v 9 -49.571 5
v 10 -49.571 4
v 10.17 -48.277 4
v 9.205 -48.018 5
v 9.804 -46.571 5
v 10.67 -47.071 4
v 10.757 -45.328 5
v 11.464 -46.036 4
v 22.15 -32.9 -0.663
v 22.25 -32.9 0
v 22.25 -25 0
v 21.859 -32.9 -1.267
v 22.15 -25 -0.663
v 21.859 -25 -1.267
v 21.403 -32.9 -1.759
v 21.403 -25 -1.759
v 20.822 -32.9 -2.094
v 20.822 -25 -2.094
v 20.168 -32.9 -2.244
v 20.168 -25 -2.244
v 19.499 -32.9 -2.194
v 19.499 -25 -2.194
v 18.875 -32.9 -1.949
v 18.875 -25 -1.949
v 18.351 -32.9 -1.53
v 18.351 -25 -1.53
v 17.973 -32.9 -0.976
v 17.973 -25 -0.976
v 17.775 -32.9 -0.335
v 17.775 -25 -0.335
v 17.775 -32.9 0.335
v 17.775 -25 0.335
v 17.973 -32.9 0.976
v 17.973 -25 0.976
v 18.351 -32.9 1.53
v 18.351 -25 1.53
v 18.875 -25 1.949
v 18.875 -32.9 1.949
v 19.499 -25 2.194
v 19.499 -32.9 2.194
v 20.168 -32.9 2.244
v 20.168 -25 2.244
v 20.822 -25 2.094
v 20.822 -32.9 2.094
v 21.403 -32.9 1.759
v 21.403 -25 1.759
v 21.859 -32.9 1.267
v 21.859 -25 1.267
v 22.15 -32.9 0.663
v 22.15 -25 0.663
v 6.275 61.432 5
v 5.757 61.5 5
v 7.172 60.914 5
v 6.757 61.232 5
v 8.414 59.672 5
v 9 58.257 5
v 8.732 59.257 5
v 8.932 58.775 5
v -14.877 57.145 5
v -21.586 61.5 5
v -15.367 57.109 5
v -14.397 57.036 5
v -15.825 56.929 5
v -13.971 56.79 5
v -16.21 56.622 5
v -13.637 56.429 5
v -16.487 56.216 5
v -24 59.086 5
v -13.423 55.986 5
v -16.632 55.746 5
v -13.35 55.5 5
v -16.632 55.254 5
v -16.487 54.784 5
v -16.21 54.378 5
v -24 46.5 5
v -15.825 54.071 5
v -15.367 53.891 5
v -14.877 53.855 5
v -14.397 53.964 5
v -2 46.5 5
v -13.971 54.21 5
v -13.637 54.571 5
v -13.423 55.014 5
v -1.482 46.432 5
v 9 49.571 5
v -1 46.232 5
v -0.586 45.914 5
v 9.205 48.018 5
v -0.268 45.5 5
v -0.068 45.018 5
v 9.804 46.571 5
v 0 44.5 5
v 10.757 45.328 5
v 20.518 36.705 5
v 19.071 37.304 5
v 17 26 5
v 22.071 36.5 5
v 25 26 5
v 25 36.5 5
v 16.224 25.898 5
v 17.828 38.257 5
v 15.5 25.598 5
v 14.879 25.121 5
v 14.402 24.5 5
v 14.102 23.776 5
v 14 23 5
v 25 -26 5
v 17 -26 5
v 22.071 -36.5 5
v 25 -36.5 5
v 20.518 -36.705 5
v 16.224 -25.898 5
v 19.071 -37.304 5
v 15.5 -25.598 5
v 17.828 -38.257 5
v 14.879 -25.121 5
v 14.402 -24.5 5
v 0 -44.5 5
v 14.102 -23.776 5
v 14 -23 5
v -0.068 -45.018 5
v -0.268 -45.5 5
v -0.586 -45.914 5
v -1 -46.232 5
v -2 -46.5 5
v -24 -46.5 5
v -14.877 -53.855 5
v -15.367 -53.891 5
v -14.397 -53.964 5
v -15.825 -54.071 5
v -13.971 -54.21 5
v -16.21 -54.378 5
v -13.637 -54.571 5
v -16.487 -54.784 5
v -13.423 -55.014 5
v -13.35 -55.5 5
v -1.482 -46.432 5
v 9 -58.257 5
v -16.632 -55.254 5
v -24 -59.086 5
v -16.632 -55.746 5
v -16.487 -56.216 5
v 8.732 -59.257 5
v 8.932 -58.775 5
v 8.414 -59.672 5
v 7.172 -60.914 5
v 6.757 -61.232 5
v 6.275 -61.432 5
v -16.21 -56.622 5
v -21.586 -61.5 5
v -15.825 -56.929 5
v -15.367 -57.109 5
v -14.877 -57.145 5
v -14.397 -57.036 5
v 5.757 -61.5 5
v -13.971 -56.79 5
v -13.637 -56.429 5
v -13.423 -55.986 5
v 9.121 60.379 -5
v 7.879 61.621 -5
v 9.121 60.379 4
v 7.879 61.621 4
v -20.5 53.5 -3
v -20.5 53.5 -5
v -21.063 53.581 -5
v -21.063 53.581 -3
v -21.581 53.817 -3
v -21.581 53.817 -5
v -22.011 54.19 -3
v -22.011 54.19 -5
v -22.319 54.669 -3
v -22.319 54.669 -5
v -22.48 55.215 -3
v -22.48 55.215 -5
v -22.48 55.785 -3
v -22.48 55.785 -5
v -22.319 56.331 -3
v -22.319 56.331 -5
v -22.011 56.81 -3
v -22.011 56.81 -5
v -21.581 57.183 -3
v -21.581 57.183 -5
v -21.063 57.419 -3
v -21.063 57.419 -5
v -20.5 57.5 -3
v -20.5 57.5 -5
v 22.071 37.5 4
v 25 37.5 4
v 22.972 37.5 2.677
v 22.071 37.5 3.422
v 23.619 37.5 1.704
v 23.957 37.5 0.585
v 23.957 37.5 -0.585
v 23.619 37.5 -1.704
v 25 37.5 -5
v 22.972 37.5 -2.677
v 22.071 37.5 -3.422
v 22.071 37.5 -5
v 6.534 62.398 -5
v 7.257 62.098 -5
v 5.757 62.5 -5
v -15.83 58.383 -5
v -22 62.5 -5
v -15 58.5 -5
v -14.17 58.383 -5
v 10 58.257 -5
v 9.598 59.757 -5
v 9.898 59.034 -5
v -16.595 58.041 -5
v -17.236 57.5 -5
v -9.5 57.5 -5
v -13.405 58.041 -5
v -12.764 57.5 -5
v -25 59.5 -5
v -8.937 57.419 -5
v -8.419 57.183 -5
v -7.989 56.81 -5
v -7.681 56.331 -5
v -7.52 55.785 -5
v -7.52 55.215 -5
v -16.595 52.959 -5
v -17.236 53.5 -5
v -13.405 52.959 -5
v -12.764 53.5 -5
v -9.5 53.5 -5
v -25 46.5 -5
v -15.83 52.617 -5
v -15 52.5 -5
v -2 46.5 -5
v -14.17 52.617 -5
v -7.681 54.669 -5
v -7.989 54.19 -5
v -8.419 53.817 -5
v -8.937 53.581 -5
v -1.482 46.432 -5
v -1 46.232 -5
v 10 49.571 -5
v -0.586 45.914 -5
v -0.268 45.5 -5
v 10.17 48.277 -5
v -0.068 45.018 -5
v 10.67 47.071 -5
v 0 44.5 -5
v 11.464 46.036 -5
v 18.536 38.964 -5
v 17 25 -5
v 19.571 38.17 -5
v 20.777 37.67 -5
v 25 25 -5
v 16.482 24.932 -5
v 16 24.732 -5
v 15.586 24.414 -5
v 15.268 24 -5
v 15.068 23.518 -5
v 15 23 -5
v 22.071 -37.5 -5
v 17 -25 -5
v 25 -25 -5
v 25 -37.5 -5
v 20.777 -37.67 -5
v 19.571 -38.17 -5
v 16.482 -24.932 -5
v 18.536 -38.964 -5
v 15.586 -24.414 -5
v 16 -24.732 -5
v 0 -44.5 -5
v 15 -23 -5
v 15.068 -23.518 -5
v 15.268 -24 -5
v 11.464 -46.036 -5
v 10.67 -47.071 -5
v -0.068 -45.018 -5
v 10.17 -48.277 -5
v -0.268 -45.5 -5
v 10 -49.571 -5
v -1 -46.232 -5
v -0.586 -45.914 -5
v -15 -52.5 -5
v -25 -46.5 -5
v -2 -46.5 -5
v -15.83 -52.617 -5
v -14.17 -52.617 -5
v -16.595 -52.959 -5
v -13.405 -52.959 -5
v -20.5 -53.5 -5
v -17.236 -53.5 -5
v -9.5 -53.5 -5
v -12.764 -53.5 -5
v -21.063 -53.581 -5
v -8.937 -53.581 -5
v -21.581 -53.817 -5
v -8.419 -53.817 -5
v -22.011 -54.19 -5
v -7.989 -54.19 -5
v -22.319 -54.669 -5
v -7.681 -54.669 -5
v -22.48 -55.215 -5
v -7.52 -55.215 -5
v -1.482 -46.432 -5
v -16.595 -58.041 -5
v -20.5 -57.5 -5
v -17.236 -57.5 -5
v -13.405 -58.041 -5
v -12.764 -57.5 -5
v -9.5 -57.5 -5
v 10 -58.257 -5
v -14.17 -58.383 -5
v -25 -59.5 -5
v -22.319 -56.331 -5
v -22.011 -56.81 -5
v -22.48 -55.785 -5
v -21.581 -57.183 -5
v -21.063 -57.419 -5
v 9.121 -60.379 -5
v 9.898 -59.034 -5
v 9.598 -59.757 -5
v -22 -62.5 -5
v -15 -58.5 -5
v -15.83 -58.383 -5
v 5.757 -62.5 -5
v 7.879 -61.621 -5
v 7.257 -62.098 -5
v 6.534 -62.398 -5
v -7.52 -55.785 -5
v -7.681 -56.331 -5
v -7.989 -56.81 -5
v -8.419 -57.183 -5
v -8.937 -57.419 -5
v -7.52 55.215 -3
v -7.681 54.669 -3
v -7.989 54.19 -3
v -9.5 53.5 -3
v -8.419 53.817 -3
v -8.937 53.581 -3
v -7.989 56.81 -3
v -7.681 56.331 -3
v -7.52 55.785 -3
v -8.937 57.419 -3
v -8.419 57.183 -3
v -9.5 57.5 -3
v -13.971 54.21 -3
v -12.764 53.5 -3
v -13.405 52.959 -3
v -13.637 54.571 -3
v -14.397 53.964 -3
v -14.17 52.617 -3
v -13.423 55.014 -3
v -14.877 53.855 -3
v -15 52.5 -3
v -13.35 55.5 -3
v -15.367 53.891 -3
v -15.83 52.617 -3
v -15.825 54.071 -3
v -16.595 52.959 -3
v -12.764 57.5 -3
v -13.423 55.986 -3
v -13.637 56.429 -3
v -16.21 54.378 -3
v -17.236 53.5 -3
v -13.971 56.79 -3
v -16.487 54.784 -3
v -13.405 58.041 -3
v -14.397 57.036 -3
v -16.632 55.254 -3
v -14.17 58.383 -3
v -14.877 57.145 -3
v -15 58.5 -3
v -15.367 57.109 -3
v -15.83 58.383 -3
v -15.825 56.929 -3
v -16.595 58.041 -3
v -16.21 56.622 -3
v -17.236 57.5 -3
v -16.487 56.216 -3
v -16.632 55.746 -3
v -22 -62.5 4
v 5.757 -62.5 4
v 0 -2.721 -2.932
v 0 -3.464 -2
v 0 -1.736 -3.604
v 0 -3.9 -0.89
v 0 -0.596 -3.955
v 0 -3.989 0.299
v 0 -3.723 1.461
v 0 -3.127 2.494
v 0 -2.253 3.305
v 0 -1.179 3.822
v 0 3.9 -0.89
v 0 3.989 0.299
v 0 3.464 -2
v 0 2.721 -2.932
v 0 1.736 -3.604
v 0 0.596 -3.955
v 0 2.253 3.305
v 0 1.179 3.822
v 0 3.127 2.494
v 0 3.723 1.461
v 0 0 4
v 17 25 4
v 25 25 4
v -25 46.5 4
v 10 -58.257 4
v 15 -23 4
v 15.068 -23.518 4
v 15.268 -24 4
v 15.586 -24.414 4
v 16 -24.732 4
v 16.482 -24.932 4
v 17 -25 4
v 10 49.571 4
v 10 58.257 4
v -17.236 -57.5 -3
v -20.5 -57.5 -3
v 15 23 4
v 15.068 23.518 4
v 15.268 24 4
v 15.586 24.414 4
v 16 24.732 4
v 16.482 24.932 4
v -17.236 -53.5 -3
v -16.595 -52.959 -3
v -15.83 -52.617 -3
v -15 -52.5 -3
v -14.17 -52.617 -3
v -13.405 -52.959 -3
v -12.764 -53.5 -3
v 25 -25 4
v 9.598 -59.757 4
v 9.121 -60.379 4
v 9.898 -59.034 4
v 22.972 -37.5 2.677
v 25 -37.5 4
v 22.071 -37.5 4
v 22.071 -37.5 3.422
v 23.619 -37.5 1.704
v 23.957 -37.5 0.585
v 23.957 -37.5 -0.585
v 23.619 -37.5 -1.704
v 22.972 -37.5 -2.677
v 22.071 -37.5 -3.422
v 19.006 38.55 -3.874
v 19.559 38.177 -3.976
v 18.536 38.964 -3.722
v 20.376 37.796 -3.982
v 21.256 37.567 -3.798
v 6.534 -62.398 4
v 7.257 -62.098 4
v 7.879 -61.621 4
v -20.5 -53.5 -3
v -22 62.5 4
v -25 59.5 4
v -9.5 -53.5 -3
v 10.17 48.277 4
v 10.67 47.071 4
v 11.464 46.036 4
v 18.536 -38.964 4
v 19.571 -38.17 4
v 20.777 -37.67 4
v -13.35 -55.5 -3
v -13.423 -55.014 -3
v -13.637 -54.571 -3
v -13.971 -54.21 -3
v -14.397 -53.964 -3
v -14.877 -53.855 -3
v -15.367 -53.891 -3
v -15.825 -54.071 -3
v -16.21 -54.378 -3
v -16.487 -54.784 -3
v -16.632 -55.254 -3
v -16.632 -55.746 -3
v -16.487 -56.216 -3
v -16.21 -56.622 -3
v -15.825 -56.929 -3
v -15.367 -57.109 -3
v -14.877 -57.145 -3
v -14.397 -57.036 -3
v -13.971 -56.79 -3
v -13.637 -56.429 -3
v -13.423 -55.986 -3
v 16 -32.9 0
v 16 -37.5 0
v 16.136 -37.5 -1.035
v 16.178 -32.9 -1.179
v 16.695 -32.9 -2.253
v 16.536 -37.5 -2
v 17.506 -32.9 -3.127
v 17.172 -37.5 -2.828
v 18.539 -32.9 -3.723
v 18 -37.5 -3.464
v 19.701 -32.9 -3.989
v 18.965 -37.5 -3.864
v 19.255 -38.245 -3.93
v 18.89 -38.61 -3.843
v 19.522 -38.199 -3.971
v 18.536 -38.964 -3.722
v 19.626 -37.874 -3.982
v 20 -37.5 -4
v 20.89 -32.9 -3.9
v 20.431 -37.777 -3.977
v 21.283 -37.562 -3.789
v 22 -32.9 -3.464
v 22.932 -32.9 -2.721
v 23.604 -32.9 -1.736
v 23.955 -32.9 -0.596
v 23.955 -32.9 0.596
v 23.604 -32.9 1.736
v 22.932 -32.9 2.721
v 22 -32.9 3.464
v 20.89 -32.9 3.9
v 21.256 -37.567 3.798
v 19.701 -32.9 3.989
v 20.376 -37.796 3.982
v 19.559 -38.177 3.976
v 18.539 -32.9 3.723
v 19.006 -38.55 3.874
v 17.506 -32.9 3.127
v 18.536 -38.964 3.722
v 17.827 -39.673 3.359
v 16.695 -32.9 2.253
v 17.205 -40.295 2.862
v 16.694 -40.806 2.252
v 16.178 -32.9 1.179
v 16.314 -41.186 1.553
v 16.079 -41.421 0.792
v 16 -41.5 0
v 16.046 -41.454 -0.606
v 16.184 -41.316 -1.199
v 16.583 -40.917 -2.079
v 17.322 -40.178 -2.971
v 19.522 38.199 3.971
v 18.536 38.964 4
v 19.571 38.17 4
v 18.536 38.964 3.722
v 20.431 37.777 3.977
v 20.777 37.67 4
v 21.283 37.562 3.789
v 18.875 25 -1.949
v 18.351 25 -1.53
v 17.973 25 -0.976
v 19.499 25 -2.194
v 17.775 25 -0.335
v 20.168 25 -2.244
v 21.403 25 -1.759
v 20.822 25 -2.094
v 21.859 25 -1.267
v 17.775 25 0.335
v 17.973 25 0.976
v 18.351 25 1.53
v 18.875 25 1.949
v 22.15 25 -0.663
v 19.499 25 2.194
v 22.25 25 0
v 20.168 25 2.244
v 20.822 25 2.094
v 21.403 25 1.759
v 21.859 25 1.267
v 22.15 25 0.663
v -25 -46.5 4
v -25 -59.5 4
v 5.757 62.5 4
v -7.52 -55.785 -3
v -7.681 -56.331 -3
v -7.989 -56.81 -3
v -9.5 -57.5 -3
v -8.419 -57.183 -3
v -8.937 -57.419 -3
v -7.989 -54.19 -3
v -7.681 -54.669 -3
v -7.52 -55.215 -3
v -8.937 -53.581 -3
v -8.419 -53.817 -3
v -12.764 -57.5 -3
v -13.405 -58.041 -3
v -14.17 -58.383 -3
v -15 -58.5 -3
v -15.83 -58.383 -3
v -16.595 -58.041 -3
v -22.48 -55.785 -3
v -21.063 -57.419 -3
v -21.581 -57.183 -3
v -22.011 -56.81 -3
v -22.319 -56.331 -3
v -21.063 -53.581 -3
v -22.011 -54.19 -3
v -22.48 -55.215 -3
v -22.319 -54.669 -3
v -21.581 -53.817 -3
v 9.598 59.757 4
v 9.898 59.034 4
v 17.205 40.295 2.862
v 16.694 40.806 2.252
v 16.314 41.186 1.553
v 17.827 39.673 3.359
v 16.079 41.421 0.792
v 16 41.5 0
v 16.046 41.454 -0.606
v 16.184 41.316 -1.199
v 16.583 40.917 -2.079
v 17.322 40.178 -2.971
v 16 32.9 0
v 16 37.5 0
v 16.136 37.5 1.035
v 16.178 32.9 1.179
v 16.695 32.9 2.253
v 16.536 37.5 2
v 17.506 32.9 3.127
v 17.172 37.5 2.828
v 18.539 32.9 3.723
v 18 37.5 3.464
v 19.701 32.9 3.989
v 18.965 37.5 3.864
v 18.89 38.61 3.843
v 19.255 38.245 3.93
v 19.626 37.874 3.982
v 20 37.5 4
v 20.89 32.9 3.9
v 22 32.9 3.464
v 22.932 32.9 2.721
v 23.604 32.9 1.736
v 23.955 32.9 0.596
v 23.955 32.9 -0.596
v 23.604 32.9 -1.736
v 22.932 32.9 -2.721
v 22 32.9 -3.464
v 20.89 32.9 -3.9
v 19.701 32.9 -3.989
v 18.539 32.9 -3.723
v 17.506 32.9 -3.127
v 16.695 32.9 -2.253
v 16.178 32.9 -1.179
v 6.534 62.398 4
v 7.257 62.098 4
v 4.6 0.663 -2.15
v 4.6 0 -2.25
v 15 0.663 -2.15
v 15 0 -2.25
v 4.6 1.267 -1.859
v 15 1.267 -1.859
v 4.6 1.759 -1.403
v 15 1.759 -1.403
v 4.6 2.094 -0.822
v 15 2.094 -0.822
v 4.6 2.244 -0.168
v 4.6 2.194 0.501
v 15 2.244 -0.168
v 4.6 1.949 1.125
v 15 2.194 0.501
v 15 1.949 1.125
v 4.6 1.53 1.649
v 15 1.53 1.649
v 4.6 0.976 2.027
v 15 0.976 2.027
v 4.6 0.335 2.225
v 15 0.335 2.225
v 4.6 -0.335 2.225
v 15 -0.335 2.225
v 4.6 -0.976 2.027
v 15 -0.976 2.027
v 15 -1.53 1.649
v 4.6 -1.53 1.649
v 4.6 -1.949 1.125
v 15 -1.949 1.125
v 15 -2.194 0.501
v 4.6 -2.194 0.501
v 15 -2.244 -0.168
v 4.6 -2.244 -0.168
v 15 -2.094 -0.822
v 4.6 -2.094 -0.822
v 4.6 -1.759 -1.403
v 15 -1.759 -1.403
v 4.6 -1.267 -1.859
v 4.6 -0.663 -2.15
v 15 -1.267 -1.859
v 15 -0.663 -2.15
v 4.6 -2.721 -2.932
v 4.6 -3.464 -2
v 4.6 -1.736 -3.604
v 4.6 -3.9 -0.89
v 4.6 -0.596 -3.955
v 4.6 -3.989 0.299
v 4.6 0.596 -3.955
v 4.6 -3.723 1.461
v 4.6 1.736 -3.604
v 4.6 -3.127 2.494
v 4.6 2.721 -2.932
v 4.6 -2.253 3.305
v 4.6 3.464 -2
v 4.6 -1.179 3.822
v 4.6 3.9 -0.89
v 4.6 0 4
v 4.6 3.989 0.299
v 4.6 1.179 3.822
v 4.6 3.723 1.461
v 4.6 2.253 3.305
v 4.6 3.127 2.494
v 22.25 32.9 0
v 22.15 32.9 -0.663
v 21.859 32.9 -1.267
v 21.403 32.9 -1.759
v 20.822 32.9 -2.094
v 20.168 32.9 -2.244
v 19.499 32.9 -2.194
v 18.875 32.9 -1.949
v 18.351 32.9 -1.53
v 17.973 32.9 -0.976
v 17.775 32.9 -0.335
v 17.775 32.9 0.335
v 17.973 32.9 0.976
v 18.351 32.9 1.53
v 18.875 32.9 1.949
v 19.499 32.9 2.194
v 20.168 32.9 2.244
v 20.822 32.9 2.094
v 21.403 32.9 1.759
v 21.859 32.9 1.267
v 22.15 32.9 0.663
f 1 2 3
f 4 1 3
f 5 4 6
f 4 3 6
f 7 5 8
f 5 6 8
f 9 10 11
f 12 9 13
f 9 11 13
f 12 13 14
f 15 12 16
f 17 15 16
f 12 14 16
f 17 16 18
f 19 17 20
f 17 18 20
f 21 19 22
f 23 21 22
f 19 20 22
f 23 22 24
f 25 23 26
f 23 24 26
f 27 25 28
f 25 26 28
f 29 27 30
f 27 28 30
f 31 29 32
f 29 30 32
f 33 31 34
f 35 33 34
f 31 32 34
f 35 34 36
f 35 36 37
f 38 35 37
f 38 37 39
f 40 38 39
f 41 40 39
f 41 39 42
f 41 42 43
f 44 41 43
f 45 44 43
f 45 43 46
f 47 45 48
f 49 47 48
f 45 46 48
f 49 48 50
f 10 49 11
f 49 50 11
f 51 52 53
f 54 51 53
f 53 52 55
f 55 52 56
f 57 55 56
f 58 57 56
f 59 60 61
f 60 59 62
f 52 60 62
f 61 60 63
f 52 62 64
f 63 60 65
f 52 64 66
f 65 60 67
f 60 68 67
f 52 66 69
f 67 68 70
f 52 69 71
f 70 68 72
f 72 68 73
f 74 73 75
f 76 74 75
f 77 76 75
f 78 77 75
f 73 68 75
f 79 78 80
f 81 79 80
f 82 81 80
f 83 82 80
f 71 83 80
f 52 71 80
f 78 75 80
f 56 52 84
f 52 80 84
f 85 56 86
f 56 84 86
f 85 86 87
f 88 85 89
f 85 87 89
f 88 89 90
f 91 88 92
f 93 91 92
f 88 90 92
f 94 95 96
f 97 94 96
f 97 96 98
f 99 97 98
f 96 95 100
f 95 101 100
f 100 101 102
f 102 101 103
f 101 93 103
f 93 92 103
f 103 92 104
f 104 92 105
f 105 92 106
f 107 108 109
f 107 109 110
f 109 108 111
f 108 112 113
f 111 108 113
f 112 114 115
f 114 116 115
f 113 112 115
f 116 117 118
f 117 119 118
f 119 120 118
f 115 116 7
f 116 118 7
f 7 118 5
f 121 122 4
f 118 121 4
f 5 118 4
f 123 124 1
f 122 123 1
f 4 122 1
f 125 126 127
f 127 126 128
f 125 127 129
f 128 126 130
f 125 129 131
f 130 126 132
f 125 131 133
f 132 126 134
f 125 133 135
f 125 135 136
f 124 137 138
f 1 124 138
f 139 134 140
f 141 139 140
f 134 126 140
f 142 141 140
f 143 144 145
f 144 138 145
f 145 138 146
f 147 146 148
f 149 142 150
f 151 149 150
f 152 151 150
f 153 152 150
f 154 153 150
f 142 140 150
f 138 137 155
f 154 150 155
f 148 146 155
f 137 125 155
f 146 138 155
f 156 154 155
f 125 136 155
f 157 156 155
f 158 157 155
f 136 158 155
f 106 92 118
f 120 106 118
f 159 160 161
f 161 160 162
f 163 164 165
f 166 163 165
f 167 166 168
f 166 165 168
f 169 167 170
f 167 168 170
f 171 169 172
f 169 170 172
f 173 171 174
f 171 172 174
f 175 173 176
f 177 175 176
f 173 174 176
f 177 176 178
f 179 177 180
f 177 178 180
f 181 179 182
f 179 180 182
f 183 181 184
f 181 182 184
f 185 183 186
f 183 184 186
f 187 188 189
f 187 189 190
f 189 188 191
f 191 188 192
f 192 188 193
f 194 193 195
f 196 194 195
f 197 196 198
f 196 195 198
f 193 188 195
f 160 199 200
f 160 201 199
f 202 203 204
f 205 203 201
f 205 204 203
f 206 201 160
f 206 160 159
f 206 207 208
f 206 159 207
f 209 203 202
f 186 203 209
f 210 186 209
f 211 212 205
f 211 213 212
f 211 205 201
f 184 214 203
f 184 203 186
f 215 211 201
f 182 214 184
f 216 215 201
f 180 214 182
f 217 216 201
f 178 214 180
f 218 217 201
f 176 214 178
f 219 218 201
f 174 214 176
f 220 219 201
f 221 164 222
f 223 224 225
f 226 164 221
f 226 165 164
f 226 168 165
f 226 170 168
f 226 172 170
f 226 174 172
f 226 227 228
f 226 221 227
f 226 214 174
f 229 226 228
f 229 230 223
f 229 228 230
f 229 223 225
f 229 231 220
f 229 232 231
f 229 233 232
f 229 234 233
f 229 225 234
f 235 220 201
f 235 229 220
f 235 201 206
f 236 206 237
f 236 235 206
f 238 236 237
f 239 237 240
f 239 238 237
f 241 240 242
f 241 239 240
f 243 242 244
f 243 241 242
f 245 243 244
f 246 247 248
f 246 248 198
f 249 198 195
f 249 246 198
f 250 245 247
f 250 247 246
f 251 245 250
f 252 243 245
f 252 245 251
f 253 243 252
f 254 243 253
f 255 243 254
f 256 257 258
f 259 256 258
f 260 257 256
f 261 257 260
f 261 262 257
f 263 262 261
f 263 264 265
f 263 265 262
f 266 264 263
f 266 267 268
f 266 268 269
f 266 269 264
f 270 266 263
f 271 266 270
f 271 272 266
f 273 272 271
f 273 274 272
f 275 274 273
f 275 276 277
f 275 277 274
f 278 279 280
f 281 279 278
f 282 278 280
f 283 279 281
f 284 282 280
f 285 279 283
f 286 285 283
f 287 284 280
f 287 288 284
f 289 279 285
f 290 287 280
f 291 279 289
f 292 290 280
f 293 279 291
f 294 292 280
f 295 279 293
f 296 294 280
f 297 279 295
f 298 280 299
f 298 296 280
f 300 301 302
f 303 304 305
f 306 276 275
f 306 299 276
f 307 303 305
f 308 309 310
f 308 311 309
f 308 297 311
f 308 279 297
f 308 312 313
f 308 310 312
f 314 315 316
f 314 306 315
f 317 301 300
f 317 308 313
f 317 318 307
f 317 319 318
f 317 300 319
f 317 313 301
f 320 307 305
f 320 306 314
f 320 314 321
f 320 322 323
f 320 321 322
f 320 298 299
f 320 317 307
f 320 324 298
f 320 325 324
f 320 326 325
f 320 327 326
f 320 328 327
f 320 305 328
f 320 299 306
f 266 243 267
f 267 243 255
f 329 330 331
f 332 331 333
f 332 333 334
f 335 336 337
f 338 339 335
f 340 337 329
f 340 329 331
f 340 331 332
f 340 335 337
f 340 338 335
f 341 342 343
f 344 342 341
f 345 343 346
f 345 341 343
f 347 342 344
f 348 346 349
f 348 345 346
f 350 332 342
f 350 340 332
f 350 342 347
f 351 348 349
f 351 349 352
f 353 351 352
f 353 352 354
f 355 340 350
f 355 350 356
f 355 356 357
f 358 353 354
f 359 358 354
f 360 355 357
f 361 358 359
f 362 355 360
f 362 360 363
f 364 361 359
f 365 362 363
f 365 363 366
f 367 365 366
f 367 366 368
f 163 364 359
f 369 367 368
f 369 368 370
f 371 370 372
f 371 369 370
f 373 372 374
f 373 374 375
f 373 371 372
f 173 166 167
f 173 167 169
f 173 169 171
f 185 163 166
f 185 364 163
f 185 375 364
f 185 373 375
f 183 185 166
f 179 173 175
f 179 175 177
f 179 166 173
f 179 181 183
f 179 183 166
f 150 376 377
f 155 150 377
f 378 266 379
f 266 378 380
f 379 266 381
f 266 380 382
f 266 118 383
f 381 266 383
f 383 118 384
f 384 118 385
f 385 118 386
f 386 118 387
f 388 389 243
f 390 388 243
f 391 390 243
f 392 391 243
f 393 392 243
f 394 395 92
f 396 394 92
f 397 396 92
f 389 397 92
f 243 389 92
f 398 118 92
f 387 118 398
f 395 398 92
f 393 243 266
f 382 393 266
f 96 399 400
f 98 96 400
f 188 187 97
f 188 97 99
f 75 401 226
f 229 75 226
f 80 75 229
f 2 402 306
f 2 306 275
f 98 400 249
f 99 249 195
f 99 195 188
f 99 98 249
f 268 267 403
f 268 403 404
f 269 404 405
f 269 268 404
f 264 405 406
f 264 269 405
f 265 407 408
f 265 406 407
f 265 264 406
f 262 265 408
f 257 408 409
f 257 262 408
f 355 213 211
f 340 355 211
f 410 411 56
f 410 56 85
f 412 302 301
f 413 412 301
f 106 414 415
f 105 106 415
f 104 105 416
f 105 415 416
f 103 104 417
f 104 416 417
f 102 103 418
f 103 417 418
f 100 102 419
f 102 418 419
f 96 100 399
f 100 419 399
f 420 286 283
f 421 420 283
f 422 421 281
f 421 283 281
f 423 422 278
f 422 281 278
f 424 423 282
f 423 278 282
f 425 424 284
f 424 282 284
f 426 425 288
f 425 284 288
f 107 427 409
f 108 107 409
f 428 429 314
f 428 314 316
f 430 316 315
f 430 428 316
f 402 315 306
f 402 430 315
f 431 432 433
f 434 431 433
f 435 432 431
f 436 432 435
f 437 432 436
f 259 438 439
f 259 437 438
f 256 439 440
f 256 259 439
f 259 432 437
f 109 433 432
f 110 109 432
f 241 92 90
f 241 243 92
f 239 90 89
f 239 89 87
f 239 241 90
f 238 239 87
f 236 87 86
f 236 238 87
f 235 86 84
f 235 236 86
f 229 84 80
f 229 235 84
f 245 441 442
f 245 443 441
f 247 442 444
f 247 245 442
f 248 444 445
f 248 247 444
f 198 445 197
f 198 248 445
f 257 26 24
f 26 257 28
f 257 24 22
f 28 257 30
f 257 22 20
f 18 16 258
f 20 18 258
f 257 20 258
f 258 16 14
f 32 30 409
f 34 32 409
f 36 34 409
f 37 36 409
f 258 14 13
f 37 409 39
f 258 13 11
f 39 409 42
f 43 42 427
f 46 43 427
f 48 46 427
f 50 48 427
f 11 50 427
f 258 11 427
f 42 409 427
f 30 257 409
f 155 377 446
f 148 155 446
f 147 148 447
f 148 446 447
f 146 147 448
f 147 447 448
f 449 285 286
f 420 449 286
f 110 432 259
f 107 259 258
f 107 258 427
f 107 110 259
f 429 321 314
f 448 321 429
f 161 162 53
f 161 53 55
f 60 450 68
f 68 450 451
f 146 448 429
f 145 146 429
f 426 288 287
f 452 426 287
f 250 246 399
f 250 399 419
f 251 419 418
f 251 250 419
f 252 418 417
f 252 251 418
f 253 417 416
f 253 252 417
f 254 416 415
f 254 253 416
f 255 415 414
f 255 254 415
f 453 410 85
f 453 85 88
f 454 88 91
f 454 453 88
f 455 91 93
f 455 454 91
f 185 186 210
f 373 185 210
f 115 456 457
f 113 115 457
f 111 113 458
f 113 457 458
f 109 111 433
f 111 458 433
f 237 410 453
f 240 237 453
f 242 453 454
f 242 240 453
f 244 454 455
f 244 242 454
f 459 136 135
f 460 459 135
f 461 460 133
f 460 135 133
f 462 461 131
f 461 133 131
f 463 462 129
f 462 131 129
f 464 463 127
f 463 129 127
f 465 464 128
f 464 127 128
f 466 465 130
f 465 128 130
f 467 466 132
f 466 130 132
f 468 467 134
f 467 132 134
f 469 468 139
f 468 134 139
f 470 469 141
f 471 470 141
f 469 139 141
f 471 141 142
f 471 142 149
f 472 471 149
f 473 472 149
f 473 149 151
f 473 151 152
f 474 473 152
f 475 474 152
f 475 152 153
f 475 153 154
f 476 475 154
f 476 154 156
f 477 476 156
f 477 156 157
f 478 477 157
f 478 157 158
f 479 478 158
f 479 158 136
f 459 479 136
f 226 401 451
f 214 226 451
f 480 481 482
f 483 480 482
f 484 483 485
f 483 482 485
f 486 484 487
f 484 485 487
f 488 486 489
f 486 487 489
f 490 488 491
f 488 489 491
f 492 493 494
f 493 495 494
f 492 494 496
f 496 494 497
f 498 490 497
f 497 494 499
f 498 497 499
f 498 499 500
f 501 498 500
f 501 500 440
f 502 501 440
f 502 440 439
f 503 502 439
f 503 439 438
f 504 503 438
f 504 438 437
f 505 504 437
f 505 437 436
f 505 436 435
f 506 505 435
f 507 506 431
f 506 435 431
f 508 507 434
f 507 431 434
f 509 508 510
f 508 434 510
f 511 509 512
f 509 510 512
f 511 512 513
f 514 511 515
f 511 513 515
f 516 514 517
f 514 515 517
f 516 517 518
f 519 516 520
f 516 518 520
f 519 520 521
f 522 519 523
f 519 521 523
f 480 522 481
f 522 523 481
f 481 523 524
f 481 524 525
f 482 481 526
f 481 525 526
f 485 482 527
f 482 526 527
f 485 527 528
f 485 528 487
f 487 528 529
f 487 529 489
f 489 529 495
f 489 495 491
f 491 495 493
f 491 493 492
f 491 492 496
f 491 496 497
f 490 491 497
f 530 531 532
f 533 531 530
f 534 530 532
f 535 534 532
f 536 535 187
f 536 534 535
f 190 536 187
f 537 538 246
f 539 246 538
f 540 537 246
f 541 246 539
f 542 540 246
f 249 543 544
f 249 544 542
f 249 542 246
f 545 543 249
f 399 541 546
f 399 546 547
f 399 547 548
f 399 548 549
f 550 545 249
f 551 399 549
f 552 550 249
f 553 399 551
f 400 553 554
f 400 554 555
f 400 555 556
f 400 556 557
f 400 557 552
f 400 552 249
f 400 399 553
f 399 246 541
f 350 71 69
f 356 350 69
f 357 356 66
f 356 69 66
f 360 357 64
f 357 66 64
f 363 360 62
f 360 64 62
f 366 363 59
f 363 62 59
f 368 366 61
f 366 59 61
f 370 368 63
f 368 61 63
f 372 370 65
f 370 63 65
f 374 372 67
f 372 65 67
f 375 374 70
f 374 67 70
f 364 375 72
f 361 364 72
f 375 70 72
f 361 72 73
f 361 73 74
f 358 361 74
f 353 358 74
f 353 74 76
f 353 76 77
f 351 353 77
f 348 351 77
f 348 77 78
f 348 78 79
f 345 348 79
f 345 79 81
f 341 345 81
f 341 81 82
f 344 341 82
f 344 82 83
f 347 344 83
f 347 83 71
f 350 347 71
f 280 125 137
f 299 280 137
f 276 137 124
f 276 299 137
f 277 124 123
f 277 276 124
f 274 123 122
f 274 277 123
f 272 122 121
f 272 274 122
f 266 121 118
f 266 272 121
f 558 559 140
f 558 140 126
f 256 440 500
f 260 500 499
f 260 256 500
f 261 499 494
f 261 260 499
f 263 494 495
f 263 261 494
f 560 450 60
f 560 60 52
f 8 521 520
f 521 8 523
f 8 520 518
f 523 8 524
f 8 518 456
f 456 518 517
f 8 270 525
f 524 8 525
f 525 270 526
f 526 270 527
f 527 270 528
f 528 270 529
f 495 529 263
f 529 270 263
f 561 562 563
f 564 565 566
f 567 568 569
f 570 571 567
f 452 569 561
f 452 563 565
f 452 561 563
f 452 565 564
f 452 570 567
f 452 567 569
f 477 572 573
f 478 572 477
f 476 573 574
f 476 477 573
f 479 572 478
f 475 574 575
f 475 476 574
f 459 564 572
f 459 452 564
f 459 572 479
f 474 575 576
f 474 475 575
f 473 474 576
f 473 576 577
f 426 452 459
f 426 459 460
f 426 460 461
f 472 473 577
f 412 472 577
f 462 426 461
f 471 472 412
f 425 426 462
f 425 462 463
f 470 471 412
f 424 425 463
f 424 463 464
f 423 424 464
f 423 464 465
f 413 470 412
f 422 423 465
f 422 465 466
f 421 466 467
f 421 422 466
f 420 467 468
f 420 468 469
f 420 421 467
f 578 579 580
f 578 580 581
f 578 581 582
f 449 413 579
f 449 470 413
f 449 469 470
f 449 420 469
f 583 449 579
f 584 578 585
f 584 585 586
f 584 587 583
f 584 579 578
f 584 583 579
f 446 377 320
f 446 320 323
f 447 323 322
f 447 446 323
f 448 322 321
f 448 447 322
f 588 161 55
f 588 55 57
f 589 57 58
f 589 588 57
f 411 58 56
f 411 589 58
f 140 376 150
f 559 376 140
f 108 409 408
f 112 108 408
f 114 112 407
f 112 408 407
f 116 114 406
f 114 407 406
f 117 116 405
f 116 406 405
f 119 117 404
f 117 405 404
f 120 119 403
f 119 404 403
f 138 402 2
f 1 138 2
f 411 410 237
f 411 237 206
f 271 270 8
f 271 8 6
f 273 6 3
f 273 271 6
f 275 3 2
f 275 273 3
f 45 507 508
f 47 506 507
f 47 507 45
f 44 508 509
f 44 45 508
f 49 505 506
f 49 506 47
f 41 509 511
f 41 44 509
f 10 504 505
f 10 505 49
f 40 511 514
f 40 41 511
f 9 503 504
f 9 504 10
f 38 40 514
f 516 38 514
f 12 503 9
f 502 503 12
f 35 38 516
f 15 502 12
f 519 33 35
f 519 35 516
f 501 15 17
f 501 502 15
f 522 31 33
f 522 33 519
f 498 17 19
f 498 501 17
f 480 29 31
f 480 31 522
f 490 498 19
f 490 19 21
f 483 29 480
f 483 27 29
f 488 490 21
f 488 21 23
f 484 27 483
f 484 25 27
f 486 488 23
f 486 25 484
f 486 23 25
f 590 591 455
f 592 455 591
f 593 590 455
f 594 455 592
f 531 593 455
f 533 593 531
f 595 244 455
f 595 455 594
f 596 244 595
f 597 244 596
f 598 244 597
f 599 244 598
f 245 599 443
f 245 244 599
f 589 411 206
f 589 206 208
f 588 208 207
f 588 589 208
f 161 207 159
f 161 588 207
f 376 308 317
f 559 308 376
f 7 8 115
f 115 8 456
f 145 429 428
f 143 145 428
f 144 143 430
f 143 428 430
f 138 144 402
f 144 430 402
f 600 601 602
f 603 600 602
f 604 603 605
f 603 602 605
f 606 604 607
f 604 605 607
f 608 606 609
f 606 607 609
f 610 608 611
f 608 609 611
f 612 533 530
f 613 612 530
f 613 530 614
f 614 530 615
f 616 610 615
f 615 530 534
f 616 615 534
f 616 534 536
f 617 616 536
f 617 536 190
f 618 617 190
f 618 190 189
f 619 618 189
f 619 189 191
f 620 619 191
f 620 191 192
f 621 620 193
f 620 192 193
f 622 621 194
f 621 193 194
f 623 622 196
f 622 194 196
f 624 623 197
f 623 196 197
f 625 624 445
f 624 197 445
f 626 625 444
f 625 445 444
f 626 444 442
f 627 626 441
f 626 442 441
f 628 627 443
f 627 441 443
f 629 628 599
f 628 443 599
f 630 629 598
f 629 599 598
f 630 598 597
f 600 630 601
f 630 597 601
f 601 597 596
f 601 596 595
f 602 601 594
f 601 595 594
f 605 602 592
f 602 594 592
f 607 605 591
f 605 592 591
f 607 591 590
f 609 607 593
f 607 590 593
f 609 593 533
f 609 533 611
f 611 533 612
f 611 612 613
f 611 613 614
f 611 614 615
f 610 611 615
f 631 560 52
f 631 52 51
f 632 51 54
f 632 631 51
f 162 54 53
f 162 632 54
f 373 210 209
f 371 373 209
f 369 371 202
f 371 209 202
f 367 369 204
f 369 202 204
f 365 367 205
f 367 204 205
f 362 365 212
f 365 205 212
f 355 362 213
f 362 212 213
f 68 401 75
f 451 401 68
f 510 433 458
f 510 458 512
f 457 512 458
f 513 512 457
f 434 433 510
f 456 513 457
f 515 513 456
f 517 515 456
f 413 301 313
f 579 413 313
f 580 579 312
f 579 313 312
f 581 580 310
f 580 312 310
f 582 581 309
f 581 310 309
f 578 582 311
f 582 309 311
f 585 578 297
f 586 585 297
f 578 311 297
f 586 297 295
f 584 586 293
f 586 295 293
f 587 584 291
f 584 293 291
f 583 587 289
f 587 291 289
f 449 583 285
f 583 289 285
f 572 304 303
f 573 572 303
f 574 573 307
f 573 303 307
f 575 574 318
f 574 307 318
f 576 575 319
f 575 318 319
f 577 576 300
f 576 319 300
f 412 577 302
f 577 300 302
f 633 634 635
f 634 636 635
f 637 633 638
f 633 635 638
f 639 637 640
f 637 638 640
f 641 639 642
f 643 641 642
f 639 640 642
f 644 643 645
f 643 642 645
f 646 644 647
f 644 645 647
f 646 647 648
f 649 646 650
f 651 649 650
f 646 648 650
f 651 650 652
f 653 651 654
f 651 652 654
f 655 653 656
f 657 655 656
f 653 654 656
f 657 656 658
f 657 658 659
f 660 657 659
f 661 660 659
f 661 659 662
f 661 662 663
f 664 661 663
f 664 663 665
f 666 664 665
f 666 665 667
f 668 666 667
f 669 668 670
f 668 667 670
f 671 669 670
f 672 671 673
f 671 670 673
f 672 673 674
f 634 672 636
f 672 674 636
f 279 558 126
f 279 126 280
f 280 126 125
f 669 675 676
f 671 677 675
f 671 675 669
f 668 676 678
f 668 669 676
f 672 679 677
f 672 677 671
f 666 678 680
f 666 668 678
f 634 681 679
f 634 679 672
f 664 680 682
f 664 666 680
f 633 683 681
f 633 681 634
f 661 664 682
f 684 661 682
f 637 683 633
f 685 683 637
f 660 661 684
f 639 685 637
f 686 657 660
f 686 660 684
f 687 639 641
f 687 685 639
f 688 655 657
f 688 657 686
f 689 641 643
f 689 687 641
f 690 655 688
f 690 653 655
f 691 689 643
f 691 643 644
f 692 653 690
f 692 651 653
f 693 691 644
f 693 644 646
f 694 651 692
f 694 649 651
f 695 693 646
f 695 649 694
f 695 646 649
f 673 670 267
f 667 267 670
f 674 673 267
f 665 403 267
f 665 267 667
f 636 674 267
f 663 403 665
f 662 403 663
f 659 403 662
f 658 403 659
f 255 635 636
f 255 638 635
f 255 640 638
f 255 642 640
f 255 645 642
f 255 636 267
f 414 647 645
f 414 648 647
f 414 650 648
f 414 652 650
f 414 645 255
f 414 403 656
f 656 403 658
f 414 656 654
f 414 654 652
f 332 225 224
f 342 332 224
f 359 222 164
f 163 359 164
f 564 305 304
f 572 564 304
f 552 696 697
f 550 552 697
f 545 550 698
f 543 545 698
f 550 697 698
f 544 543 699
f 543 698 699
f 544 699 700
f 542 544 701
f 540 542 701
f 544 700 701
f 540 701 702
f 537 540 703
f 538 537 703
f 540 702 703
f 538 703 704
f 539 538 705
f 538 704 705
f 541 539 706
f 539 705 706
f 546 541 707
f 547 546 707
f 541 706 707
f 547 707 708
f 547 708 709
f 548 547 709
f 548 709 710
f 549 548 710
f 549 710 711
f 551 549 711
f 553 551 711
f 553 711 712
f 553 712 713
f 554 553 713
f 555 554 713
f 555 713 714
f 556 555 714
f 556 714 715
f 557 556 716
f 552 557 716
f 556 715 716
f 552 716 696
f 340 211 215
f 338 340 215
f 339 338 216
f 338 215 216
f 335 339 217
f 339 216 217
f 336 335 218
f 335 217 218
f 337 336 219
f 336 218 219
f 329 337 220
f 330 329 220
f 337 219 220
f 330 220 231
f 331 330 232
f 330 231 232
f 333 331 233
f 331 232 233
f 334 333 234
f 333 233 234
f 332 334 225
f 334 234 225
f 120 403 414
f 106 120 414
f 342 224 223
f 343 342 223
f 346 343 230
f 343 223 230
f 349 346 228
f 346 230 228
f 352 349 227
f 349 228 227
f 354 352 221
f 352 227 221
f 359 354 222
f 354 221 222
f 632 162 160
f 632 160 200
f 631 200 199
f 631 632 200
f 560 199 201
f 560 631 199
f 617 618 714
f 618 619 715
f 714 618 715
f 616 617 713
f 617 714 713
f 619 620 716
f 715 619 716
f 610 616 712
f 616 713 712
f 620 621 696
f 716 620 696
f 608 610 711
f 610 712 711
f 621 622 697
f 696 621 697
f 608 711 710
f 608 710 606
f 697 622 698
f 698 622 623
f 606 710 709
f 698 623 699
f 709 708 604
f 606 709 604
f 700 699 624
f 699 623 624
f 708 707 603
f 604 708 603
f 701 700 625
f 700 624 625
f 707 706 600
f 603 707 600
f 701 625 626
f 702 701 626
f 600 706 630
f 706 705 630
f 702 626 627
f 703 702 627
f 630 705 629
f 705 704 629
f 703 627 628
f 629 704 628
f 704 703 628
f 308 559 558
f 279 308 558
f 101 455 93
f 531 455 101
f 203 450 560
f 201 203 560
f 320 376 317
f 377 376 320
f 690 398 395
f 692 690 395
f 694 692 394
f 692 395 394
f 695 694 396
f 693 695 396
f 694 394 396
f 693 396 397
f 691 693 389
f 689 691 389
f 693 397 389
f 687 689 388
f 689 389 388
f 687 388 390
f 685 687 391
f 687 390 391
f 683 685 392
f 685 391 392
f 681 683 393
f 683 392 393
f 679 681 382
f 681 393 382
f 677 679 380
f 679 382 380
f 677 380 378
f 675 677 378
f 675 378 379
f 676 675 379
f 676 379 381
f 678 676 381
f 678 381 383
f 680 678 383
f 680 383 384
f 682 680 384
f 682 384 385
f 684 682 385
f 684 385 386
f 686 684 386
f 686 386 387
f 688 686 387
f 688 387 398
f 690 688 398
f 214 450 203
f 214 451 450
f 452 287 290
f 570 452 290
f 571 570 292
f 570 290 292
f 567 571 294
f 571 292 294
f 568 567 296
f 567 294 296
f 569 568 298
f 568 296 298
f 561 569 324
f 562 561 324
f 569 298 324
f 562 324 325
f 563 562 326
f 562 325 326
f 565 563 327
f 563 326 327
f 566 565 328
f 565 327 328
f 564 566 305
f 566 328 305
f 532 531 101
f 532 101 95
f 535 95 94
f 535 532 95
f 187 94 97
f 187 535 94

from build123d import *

# Parameters (mm, degrees)
SKETCH1_W                                            = 50
SKETCH1_H                                            = 125
BOSS_EXTRUDE1_DEPTH                                  = 5
SKETCH2_W                                            = 25
SKETCH2_H                                            = 93
CUT_EXTRUDE1_DEPTH                                   = 69.053287944
SKETCH3_W                                            = 10
SKETCH3_H                                            = 50
CUT_EXTRUDE2_DEPTH                                   = 69.053287944
CUT_EXTRUDE3_DEPTH                                   = 2
M4_TAPPED_HOLE1_D                                    = 3.3
SKETCH7_W                                            = 15
SKETCH7_H                                            = 25
CUT_EXTRUDE4_DEPTH                                   = 69.053287944
CBORE_FOR_M4_SLOTTED_CHEESE_HEAD_SCREWS2_D           = 4.5
CBORE_FOR_M4_SLOTTED_CHEESE_HEAD_SCREWS2_CBORE_D     = 8
CBORE_FOR_M4_SLOTTED_CHEESE_HEAD_SCREWS2_CBORE_DEPTH = 4.6
CBORE_FOR_M4_SLOTTED_CHEESE_HEAD_SCREWS3_D           = 4.5
CBORE_FOR_M4_SLOTTED_CHEESE_HEAD_SCREWS3_CBORE_D     = 8
CBORE_FOR_M4_SLOTTED_CHEESE_HEAD_SCREWS3_CBORE_DEPTH = 4.6
CHAMFER1_SIZE                                        = 10
FILLET1_R                                            = 5
FILLET2_R                                            = 2
CHAMFER2_SIZE                                        = 3
FILLET3_R                                            = 3
CHAMFER3_SIZE                                        = 1


# Some blends are built 0.0001 mm under size
with BuildPart() as part:
    # Sketch1 → Boss-Extrude1 (new, symmetric)
    with BuildSketch(Plane.XY):
        Rectangle(SKETCH1_W, SKETCH1_H)
    extrude(amount=BOSS_EXTRUDE1_DEPTH, both=True)

    # Sketch2 → Cut-Extrude1 (cut, through all)
    with BuildSketch(Plane.XY.offset(5)):
        with Locations((-12.5, 0)):
            Rectangle(SKETCH2_W, SKETCH2_H)
    extrude(amount=-CUT_EXTRUDE1_DEPTH, mode=Mode.SUBTRACT)

    # Sketch3 → Cut-Extrude2 (cut, through all)
    with BuildSketch(Plane.XY.offset(5)):
        with Locations((20, 0)):
            Rectangle(SKETCH3_W, SKETCH3_H)
    extrude(amount=-CUT_EXTRUDE2_DEPTH, mode=Mode.SUBTRACT)

    # Sketch4 → Cut-Extrude3 (cut)
    with BuildSketch(Plane(origin=(0, 0, -5), x_dir=(-1, 0, 0), z_dir=(0, 0, -1))):
        with BuildLine():
            Line((9.5, -57.5), (12.763932023, -57.5))
            ThreePointArc((12.763932023, -57.5), (12, -55.5), (12.763932023, -53.5))
            Line((12.763932023, -53.5), (9.5, -53.5))
            ThreePointArc((9.5, -53.5), (7.5, -55.5), (9.5, -57.5))
        make_face()
        with BuildLine():
            Line((12.763932023, -57.5), (17.236067977, -57.5))
            ThreePointArc((17.236067977, -57.5), (17.802517077, -56.570466269), (18, -55.5))
            ThreePointArc((18, -55.5), (17.802517077, -54.429533731), (17.236067977, -53.5))
            Line((17.236067977, -53.5), (12.763932023, -53.5))
            ThreePointArc((12.763932023, -53.5), (12, -55.5), (12.763932023, -57.5))
        make_face()
        with BuildLine():
            Line((12.763932023, -53.5), (17.236067977, -53.5))
            ThreePointArc((17.236067977, -53.5), (15, -52.5), (12.763932023, -53.5))
        make_face()
        with BuildLine():
            Line((17.236067977, -57.5), (20.5, -57.5))
            ThreePointArc((20.5, -57.5), (22.5, -55.5), (20.5, -53.5))
            Line((20.5, -53.5), (17.236067977, -53.5))
            ThreePointArc((17.236067977, -53.5), (17.802517077, -54.429533731), (18, -55.5))
            ThreePointArc((18, -55.5), (17.802517077, -56.570466269), (17.236067977, -57.5))
        make_face()
        with BuildLine():
            ThreePointArc((12.763932023, -57.5), (15, -58.5), (17.236067977, -57.5))
            Line((17.236067977, -57.5), (12.763932023, -57.5))
        make_face()
        with BuildLine():
            ThreePointArc((12.763932023, 53.5), (12, 55.5), (12.763932023, 57.5))
            Line((12.763932023, 57.5), (9.5, 57.5))
            ThreePointArc((9.5, 57.5), (7.5, 55.5), (9.5, 53.5))
            Line((9.5, 53.5), (12.763932023, 53.5))
        make_face()
        with BuildLine():
            Line((12.763932023, 57.5), (17.236067977, 57.5))
            ThreePointArc((17.236067977, 57.5), (15, 58.5), (12.763932023, 57.5))
        make_face()
        with BuildLine():
            ThreePointArc((18, 55.5), (17.802517077, 56.570466269), (17.236067977, 57.5))
            Line((17.236067977, 57.5), (12.763932023, 57.5))
            ThreePointArc((12.763932023, 57.5), (12, 55.5), (12.763932023, 53.5))
            Line((12.763932023, 53.5), (17.236067977, 53.5))
            ThreePointArc((17.236067977, 53.5), (17.802517077, 54.429533731), (18, 55.5))
        make_face()
        with BuildLine():
            ThreePointArc((20.5, 53.5), (22.5, 55.5), (20.5, 57.5))
            Line((20.5, 57.5), (17.236067977, 57.5))
            ThreePointArc((17.236067977, 57.5), (17.802517077, 56.570466269), (18, 55.5))
            ThreePointArc((18, 55.5), (17.802517077, 54.429533731), (17.236067977, 53.5))
            Line((17.236067977, 53.5), (20.5, 53.5))
        make_face()
        with BuildLine():
            ThreePointArc((12.763932023, 53.5), (15, 52.5), (17.236067977, 53.5))
            Line((17.236067977, 53.5), (12.763932023, 53.5))
        make_face()
    extrude(amount=-CUT_EXTRUDE3_DEPTH, mode=Mode.SUBTRACT)

    # M4 Tapped Hole1 (through all)
    with Locations(Plane(origin=(0, 0, -5), x_dir=(-1, 0, 0), z_dir=(0, 0, -1))):
        with Locations((15, -55.5), (15, 55.5)):
            Hole(M4_TAPPED_HOLE1_D / 2)

    # Sketch7 → Cut-Extrude4 (cut, through all)
    with BuildSketch(Plane(origin=(0, 0, -5), x_dir=(-1, 0, 0), z_dir=(0, 0, -1))):
        with Locations((-17.5, -50)):
            Rectangle(SKETCH7_W, SKETCH7_H)
        with Locations((-17.5, 50)):
            Rectangle(SKETCH7_W, SKETCH7_H)
    extrude(amount=-CUT_EXTRUDE4_DEPTH, mode=Mode.SUBTRACT)

    # CBORE for M4 Slotted cheese head screws2 (through all)
    with Locations(Plane(origin=(0, -37.5, 0), x_dir=(-1, 0, 0), z_dir=(0, -1, 0))):
        with Locations((-20, 0)):
            cbore_for_m4_slotted_cheese_head_screws2 = CounterBoreHole(CBORE_FOR_M4_SLOTTED_CHEESE_HEAD_SCREWS2_D / 2, CBORE_FOR_M4_SLOTTED_CHEESE_HEAD_SCREWS2_CBORE_D / 2, CBORE_FOR_M4_SLOTTED_CHEESE_HEAD_SCREWS2_CBORE_DEPTH)

    # CBORE for M4 Slotted cheese head screws3 (through all)
    with Locations(Plane.ZY):
        with Locations((0, 0)):
            CounterBoreHole(CBORE_FOR_M4_SLOTTED_CHEESE_HEAD_SCREWS3_D / 2, CBORE_FOR_M4_SLOTTED_CHEESE_HEAD_SCREWS3_CBORE_D / 2, CBORE_FOR_M4_SLOTTED_CHEESE_HEAD_SCREWS3_CBORE_DEPTH)

    # Mirror1: CBORE for M4 Slotted cheese head screws2 across plane
    add(cbore_for_m4_slotted_cheese_head_screws2.mirror(Plane.ZX), mode=Mode.SUBTRACT)

    # Chamfer1
    # the kernel refuses this chamfer: 10 mm, written as the material it adds along each edge
    with BuildSketch(Plane(origin=(10, -37.5, -5), x_dir=(-0.027495876610586317, -0.9996219169112968, 0), z_dir=(0, 0, 1))) as chamfer1_piece_1_section:
        Polygon((CHAMFER1_SIZE * 0.999621916911, CHAMFER1_SIZE * 0.0274958766106), (-CHAMFER1_SIZE * 0.0274958766106, CHAMFER1_SIZE * 0.999621916911), (0, 0), align=None)
    chamfer1_piece_1 = extrude(amount=10, mode=Mode.PRIVATE)
    chamfer1_piece_1 = chamfer1_piece_1 - Plane(origin=(20, -41.045650517, 0), x_dir=(-1, 0, 0), z_dir=(0, -1, 0)) * Cylinder(4, 60, mode=Mode.PRIVATE)
    add(chamfer1_piece_1)
    with BuildSketch(Plane(origin=(10, 37.5, -5), x_dir=(-0.027495876610586317, 0.9996219169112968, 0), z_dir=(0, 0, 1))) as chamfer1_piece_2_section:
        Polygon((CHAMFER1_SIZE * 0.999621916911, -CHAMFER1_SIZE * 0.0274958766106), (-CHAMFER1_SIZE * 0.0274958766106, -CHAMFER1_SIZE * 0.999621916911), (0, 0), align=None)
    chamfer1_piece_2 = extrude(amount=10, mode=Mode.PRIVATE)
    chamfer1_piece_2 = chamfer1_piece_2 - Plane(origin=(20, 41.045650517, 0), x_dir=(-1, 0, 0), z_dir=(0, 1, 0)) * Cylinder(4, 60, mode=Mode.PRIVATE)
    add(chamfer1_piece_2)

    # Fillet1
    # the kernel refuses this fillet: 5 mm, written as the material it adds along each edge
    with BuildSketch(Plane(origin=(10, -47.5, -5), x_dir=(0.707106781186831, 0.707106781186264, 0), z_dir=(0, 0, 1))) as fillet1_piece_1:
        with BuildLine():
            CenterArc((FILLET1_R * 0.414213562373, -FILLET1_R), FILLET1_R, 90, 45)
            Line((-FILLET1_R * 0.292893218814, -FILLET1_R * 0.292893218814), (0, 0))
            Line((0, 0), (FILLET1_R * 0.414213562373, 0))
        make_face()
    extrude(amount=10)
    with BuildSketch(Plane(origin=(20, -37.5, -5), x_dir=(-0.7071067811868298, -0.7071067811862654, 0), z_dir=(0, 0, 1))) as fillet1_piece_2_section:
        with BuildLine():
            CenterArc((FILLET1_R * 0.414213562373, FILLET1_R), FILLET1_R, 225, 45)
            Line((-FILLET1_R * 0.292893218813, FILLET1_R * 0.292893218813), (0, 0))
            Line((0, 0), (FILLET1_R * 0.414213562373, 0))
        make_face()
    fillet1_piece_2 = extrude(amount=6.17766953, mode=Mode.PRIVATE)
    fillet1_piece_2 = fillet1_piece_2 - Plane(origin=(20, -37.809724496, 0), x_dir=(-1, 0, 0), z_dir=(0, -1, 0)) * Cylinder(4, 21, mode=Mode.PRIVATE)
    add(fillet1_piece_2)
    with BuildSketch(Plane(origin=(10, 47.5, -5), x_dir=(0.707106781186831, -0.707106781186264, 0), z_dir=(0, 0, 1))) as fillet1_piece_3:
        with BuildLine():
            CenterArc((FILLET1_R * 0.414213562373, FILLET1_R), FILLET1_R, 225, 45)
            Line((-FILLET1_R * 0.292893218814, FILLET1_R * 0.292893218814), (0, 0))
            Line((0, 0), (FILLET1_R * 0.414213562373, 0))
        make_face()
    extrude(amount=10)
    with BuildSketch(Plane(origin=(20, 37.5, -5), x_dir=(-0.7071067811868298, 0.7071067811862654, 0), z_dir=(0, 0, 1))) as fillet1_piece_4_section:
        with BuildLine():
            CenterArc((FILLET1_R * 0.414213562373, -FILLET1_R), FILLET1_R, 90, 45)
            Line((-FILLET1_R * 0.292893218813, -FILLET1_R * 0.292893218813), (0, 0))
            Line((0, 0), (FILLET1_R * 0.414213562373, 0))
        make_face()
    fillet1_piece_4 = extrude(amount=6.17766953, mode=Mode.PRIVATE)
    fillet1_piece_4 = fillet1_piece_4 - Plane(origin=(20, 37.8097245, 0), x_dir=(-1, 0, 0), z_dir=(0, 1, 0)) * Cylinder(4, 21, mode=Mode.PRIVATE)
    add(fillet1_piece_4)
    with BuildSketch(Plane(origin=(20, -37.5, -1.17766953), x_dir=(-0.7071067811868306, -0.7071067811862645, 0), z_dir=(0, 0, 1))) as fillet1_piece_5_section:
        with BuildLine():
            CenterArc((FILLET1_R * 0.414213562373, FILLET1_R), FILLET1_R, 225, 45)
            Line((-FILLET1_R * 0.292893218813, FILLET1_R * 0.292893218813), (0, 0))
            Line((0, 0), (FILLET1_R * 0.414213562373, 0))
        make_face()
    fillet1_piece_5 = extrude(amount=6.17766953, mode=Mode.PRIVATE)
    fillet1_piece_5 = fillet1_piece_5 - Plane(origin=(20, -37.8097245, 0), x_dir=(-1, 0, 0), z_dir=(0, -1, 0)) * Cylinder(4, 21, mode=Mode.PRIVATE)
    add(fillet1_piece_5)
    with BuildSketch(Plane(origin=(20, 37.5, -1.17766953), x_dir=(-0.7071067811868306, 0.7071067811862645, 0), z_dir=(0, 0, 1))) as fillet1_piece_6_section:
        with BuildLine():
            CenterArc((FILLET1_R * 0.414213562373, -FILLET1_R), FILLET1_R, 90, 45)
            Line((-FILLET1_R * 0.292893218813, -FILLET1_R * 0.292893218813), (0, 0))
            Line((0, 0), (FILLET1_R * 0.414213562373, 0))
        make_face()
    fillet1_piece_6 = extrude(amount=6.17766953, mode=Mode.PRIVATE)
    fillet1_piece_6 = fillet1_piece_6 - Plane(origin=(20, 37.809724496, 0), x_dir=(-1, 0, 0), z_dir=(0, 1, 0)) * Cylinder(4, 21, mode=Mode.PRIVATE)
    add(fillet1_piece_6)

    # Fillet2
    fillet2_edges = [part.edges().sort_by_distance(p)[0] for p in [
        (0, 46.5, 0),
        (0, -46.5, 0),
        (15, -25, 0),
        (15, 25, 0),
    ]]
    fillet(fillet2_edges, radius=FILLET2_R)

    # Chamfer2
    chamfer2_edges = [part.edges().sort_by_distance(p)[0] for p in [
        (10, -62.5, 0),
        (10, 62.5, 0),
        (-25, 62.5, 0),
        (-25, -62.5, 0),
    ]]
    chamfer(chamfer2_edges, length=CHAMFER2_SIZE)

    # Fillet3
    fillet3_edges = [part.edges().sort_by_distance(p)[0] for p in [
        (7, -62.5, 0),
        (7, 62.5, 0),
        (10, -59.5, 0),
        (10, 59.5, 0),
    ]]
    fillet(fillet3_edges, radius=FILLET3_R)

    # Chamfer3
    chamfer3_edges = [part.edges().sort_by_distance(p)[0] for p in [
        (23.535533906, 37.5, 5),
        (-25, -53, 5),
        (15, -42.5, 5),
        (23.535533906, -37.5, 5),
        (10, 53.914213562, 5),
        (15, 42.5, 5),
        (10.380602337, -47.65765065, 5),
        (20.15765065, -37.880602337, 5),
        (10.380602337, 47.65765065, 5),
        (20.15765065, 37.880602337, 5),
        (15, 0, 5),
        (21, -25, 5),
        (15.585786438, 24.414213562, 5),
        (15.585786438, -24.414213562, 5),
        (-8.121320344, -62.5, 5),
        (-8.121320344, 62.5, 5),
        (-25, 53, 5),
        (-23.5, 61, 5),
        (-23.5, -61, 5),
        (8.5, 61, 5),
        (8.5, -61, 5),
        (10, -53.914213562, 5),
        (6.90540961, -62.271638598, 5),
        (9.771638598, -59.40540961, 5),
        (9.771638598, 59.40540961, 5),
        (6.90540961, 62.271638598, 5),
        (21, 25, 5),
    ]]
    chamfer(chamfer3_edges, length=CHAMFER3_SIZE - 0.0001)  # a hair under: the kernel refuses the full size


solid = part.part
